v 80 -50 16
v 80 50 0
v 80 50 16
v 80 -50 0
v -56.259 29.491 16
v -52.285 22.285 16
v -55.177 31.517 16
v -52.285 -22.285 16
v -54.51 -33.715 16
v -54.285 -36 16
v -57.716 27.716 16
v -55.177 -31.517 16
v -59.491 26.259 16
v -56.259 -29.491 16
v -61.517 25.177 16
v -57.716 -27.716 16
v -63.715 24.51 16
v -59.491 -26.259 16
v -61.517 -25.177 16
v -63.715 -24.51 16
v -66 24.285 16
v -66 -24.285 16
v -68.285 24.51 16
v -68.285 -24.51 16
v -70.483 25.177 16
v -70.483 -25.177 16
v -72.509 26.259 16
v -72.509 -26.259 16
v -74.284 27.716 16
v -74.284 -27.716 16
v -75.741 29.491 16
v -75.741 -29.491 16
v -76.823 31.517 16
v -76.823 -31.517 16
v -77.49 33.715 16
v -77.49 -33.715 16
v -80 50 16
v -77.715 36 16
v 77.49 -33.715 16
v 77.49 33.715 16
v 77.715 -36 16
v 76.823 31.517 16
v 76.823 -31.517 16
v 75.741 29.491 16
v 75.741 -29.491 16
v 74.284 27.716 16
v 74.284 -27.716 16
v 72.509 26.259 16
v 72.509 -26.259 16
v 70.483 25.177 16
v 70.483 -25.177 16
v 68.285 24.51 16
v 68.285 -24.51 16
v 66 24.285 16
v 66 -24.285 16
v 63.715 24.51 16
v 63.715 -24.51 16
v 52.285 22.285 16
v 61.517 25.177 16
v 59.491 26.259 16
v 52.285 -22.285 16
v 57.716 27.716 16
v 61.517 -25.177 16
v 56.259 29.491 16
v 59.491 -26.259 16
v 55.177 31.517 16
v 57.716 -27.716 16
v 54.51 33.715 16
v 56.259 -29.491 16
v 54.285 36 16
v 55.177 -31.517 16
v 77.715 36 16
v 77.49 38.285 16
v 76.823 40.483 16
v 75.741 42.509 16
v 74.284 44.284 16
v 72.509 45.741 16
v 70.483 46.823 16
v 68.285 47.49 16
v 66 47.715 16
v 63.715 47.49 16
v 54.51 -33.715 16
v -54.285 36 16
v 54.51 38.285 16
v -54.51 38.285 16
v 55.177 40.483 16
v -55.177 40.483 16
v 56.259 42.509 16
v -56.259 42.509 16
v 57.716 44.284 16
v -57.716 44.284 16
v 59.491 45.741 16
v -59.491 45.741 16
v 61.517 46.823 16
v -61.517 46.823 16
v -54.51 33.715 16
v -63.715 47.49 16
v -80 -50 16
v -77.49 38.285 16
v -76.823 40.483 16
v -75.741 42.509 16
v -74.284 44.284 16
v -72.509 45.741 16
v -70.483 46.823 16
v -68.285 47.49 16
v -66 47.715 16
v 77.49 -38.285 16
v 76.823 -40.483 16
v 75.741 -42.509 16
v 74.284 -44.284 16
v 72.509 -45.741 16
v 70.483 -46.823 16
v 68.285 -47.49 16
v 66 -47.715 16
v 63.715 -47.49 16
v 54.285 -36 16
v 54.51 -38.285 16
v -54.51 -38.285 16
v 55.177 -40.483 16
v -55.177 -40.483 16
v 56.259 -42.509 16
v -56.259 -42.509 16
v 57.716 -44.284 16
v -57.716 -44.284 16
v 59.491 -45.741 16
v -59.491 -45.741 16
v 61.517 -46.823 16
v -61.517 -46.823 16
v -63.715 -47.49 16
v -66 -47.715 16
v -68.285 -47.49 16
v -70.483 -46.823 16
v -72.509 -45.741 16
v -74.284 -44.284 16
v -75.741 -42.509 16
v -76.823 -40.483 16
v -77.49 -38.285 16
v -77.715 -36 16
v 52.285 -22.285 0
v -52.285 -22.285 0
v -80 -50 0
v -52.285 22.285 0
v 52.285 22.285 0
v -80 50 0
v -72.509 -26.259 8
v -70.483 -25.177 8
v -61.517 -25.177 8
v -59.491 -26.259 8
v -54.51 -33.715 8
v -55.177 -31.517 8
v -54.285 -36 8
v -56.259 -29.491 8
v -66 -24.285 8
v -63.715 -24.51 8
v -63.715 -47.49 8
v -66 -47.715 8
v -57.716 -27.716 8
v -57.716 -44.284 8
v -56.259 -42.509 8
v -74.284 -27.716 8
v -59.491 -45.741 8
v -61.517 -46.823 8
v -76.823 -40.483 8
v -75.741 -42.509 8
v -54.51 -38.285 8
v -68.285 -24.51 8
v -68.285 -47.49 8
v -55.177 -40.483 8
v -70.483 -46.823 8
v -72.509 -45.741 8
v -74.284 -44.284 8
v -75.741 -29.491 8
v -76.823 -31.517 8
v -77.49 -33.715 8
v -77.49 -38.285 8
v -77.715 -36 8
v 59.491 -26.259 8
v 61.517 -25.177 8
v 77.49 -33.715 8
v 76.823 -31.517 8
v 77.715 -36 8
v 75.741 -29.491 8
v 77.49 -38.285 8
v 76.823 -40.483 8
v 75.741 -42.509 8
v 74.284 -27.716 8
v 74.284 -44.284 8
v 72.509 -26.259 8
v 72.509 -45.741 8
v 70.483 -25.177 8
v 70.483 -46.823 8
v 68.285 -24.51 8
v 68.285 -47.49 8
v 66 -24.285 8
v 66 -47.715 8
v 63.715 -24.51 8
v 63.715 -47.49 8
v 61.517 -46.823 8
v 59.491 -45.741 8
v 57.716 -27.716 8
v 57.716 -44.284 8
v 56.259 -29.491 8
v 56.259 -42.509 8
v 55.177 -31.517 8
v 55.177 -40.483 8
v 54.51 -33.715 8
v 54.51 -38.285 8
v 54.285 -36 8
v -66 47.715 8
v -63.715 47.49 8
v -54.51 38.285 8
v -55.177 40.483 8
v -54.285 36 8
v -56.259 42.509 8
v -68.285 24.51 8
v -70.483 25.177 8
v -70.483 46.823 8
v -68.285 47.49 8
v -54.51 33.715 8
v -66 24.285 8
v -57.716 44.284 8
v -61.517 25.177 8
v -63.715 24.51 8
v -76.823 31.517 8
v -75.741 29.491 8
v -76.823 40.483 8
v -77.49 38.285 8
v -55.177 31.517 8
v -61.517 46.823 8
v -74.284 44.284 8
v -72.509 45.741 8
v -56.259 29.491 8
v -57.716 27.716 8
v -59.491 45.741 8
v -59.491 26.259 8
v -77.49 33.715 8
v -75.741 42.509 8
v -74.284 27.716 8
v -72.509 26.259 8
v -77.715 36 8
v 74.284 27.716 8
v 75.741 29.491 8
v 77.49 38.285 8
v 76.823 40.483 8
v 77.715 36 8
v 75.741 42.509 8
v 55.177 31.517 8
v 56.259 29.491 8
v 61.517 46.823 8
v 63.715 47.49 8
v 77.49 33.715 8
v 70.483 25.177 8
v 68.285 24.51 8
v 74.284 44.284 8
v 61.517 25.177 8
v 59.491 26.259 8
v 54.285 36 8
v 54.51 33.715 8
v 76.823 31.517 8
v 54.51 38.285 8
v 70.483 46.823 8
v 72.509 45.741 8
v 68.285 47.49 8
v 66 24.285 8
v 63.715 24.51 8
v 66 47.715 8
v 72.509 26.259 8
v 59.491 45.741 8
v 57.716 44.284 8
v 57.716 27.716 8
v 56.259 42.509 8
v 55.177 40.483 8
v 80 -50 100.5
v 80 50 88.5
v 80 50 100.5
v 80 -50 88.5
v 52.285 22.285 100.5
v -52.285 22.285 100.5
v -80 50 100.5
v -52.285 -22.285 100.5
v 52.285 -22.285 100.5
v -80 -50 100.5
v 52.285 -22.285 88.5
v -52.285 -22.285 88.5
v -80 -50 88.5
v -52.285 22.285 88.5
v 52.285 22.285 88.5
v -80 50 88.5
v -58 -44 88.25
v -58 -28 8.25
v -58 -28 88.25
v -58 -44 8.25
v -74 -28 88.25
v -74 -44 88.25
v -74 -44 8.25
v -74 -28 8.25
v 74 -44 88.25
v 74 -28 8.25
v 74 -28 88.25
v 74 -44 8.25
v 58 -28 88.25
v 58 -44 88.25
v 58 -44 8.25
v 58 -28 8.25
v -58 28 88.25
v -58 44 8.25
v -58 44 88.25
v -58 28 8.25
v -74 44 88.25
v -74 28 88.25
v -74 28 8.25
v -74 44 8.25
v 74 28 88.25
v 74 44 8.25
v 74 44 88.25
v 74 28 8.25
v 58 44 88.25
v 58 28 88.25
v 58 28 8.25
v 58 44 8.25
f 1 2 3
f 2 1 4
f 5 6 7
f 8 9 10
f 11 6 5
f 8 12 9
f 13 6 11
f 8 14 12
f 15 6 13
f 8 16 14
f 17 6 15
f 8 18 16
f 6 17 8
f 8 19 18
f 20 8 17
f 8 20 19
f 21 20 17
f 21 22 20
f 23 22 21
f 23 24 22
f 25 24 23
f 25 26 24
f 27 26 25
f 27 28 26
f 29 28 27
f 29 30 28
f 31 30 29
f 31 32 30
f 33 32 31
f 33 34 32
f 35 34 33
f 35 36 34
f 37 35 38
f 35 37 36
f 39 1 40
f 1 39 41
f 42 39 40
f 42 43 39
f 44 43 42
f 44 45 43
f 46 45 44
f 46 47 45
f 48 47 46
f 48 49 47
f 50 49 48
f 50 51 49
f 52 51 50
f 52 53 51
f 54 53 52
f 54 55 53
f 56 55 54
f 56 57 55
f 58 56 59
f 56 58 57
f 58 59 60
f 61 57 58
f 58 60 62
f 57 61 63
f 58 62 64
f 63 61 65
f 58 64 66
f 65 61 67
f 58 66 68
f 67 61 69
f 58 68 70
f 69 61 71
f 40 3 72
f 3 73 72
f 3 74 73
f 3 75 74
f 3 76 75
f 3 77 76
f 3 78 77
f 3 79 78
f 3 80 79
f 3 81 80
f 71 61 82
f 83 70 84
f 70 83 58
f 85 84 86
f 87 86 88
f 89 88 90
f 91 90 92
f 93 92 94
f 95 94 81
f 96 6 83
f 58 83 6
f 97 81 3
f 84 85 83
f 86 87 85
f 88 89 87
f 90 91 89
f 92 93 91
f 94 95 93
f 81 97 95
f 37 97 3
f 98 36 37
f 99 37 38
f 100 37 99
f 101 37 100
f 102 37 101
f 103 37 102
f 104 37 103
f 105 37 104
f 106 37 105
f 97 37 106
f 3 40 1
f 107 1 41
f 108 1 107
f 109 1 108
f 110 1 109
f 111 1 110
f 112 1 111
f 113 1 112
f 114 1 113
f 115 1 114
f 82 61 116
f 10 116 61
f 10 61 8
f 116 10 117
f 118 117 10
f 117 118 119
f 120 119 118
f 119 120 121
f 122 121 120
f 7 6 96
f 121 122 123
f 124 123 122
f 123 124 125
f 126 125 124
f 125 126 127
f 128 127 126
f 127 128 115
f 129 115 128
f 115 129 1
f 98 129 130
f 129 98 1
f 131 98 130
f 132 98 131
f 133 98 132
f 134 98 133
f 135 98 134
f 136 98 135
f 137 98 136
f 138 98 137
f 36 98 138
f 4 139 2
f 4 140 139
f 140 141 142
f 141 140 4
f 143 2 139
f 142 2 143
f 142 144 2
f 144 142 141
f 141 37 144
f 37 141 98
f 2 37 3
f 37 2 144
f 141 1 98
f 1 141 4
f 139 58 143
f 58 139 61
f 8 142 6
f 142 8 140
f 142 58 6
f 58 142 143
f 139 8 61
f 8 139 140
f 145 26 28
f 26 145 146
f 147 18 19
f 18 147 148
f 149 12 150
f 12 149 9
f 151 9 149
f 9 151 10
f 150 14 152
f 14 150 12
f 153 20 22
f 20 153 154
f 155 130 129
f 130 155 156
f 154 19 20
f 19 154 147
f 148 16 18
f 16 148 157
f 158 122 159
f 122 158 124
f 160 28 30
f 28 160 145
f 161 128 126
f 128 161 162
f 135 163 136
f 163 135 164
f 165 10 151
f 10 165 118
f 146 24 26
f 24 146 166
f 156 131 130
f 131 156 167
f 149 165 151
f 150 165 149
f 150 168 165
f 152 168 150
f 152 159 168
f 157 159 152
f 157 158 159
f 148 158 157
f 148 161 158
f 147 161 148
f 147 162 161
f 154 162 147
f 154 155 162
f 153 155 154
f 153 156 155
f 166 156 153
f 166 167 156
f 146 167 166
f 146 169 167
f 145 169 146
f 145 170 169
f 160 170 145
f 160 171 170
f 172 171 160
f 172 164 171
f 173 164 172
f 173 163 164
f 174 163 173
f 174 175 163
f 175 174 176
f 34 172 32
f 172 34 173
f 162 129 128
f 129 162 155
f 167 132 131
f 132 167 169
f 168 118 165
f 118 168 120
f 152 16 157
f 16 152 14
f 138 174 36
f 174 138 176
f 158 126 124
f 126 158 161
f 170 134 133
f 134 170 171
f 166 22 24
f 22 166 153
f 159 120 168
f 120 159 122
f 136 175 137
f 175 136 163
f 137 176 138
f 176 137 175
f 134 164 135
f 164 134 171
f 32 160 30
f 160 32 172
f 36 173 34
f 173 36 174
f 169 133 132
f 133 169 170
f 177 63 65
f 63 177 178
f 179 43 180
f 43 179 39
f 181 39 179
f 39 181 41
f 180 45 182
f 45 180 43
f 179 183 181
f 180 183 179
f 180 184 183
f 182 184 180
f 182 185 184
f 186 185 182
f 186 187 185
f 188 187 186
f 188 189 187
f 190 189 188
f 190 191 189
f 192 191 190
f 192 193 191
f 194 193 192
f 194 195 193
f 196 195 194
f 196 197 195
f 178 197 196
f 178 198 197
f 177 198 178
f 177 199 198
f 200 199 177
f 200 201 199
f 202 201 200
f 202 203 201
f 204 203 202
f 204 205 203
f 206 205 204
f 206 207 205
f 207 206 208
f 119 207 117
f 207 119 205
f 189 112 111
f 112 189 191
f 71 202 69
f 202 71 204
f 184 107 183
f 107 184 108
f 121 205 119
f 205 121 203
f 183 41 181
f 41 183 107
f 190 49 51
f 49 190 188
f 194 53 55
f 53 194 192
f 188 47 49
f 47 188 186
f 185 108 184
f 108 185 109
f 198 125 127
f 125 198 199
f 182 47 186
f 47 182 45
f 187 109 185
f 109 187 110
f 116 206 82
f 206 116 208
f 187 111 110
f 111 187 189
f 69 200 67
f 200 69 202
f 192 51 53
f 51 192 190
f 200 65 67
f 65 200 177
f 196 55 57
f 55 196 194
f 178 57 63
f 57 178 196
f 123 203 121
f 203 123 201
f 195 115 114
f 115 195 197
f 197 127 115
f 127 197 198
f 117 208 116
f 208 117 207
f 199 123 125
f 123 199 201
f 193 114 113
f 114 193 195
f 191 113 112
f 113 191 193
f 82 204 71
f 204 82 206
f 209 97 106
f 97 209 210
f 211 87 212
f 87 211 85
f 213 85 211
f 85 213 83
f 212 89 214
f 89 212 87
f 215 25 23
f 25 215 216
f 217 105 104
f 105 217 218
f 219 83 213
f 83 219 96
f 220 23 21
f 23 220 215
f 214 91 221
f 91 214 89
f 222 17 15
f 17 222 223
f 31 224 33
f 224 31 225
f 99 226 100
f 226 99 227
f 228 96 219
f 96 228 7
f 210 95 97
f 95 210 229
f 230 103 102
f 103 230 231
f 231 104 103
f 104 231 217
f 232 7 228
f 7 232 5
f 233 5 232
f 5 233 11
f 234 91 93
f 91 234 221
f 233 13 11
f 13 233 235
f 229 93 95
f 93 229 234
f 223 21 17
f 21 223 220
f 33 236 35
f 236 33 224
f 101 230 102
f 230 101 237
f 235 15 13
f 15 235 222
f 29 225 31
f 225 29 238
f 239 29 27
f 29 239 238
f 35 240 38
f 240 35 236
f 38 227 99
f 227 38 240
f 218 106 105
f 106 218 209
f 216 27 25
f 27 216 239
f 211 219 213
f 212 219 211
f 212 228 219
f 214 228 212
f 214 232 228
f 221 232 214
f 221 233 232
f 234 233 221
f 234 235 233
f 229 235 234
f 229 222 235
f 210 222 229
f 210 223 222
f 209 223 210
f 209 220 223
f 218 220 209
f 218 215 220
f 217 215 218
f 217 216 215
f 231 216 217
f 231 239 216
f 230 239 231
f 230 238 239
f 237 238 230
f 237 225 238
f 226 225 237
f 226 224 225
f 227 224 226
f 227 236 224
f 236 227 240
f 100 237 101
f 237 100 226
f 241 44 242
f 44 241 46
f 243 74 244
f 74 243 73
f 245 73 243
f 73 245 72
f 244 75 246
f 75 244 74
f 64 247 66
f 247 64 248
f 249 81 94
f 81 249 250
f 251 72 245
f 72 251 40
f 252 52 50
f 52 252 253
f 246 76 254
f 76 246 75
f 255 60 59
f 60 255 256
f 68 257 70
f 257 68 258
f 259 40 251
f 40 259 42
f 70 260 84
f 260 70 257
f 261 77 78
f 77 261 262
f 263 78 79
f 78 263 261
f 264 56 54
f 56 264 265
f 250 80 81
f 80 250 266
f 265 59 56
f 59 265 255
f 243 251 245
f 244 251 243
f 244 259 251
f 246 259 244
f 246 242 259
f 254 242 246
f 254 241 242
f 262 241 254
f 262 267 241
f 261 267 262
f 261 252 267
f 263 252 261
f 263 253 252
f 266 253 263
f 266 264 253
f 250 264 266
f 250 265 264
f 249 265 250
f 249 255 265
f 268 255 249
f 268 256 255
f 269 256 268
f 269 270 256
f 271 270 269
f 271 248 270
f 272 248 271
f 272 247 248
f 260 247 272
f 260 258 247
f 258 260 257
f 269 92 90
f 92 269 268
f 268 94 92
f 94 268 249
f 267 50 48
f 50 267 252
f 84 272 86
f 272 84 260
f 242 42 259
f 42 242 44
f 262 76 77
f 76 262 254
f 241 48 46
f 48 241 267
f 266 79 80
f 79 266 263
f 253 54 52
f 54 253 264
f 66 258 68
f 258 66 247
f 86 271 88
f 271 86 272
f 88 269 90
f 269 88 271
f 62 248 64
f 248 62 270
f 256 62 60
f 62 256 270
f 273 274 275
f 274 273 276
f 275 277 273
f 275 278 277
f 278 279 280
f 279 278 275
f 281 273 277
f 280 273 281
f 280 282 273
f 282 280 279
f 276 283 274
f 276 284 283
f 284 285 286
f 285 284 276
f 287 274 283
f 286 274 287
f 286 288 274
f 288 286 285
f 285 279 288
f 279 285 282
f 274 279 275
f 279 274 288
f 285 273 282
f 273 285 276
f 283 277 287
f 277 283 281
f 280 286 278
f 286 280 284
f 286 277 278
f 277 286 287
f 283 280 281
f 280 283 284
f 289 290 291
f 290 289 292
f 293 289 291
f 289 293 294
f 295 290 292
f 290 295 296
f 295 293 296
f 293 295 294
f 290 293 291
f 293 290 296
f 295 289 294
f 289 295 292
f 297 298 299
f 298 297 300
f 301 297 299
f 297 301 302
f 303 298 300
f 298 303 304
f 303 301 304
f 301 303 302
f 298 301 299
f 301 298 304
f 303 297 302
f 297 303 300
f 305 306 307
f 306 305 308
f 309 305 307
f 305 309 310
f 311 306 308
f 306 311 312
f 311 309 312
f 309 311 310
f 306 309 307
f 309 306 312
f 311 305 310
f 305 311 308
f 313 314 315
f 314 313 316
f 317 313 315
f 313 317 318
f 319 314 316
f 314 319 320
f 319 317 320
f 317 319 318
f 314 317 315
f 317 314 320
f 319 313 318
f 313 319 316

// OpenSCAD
$fn = 32;

// ------------------------------------------------------------------------
// Frame cube: base 160 x 100 mm, posts 80 mm tall
// Every part is its own module, assembly() places every instance.
// ------------------------------------------------------------------------

// --- part 1 ---
module base_frame() {
  difference() {
    translate([-80, -50, 0]) cube([160, 100, 16]);
    translate([-52.285, -22.285, -1]) cube([104.57, 44.57, 18]);
    translate([-66, -36, 8]) cylinder(h = 9, d = 23.43);
    translate([66, -36, 8]) cylinder(h = 9, d = 23.43);
    translate([-66, 36, 8]) cylinder(h = 9, d = 23.43);
    translate([66, 36, 8]) cylinder(h = 9, d = 23.43);
  }
}

// --- part 2 ---
module corner_post() {
  translate([-8, -8, 0]) cube([16, 16, 80]);
}

// --- part 3 ---
module top_frame() {
  difference() {
    translate([-80, -50, 0]) cube([160, 100, 12]);
    translate([-52.285, -22.285, -1]) cube([104.57, 44.57, 14]);
  }
}

// --- assembly ---
module assembly() {
  color([0.80, 0.24, 0.20]) translate([0, 0, 0]) rotate([0, 0, 0]) base_frame();
  color([0.20, 0.45, 0.75]) translate([-66, -36, 8.25]) rotate([0, 0, 0]) corner_post();
  color([0.25, 0.62, 0.32]) translate([66, -36, 8.25]) rotate([0, 0, 0]) corner_post();
  color([0.92, 0.70, 0.18]) translate([-66, 36, 8.25]) rotate([0, 0, 0]) corner_post();
  color([0.58, 0.35, 0.70]) translate([66, 36, 8.25]) rotate([0, 0, 0]) corner_post();
  color([0.16, 0.66, 0.66]) translate([0, 0, 88.5]) rotate([0, 0, 0]) top_frame();
}

assembly();
